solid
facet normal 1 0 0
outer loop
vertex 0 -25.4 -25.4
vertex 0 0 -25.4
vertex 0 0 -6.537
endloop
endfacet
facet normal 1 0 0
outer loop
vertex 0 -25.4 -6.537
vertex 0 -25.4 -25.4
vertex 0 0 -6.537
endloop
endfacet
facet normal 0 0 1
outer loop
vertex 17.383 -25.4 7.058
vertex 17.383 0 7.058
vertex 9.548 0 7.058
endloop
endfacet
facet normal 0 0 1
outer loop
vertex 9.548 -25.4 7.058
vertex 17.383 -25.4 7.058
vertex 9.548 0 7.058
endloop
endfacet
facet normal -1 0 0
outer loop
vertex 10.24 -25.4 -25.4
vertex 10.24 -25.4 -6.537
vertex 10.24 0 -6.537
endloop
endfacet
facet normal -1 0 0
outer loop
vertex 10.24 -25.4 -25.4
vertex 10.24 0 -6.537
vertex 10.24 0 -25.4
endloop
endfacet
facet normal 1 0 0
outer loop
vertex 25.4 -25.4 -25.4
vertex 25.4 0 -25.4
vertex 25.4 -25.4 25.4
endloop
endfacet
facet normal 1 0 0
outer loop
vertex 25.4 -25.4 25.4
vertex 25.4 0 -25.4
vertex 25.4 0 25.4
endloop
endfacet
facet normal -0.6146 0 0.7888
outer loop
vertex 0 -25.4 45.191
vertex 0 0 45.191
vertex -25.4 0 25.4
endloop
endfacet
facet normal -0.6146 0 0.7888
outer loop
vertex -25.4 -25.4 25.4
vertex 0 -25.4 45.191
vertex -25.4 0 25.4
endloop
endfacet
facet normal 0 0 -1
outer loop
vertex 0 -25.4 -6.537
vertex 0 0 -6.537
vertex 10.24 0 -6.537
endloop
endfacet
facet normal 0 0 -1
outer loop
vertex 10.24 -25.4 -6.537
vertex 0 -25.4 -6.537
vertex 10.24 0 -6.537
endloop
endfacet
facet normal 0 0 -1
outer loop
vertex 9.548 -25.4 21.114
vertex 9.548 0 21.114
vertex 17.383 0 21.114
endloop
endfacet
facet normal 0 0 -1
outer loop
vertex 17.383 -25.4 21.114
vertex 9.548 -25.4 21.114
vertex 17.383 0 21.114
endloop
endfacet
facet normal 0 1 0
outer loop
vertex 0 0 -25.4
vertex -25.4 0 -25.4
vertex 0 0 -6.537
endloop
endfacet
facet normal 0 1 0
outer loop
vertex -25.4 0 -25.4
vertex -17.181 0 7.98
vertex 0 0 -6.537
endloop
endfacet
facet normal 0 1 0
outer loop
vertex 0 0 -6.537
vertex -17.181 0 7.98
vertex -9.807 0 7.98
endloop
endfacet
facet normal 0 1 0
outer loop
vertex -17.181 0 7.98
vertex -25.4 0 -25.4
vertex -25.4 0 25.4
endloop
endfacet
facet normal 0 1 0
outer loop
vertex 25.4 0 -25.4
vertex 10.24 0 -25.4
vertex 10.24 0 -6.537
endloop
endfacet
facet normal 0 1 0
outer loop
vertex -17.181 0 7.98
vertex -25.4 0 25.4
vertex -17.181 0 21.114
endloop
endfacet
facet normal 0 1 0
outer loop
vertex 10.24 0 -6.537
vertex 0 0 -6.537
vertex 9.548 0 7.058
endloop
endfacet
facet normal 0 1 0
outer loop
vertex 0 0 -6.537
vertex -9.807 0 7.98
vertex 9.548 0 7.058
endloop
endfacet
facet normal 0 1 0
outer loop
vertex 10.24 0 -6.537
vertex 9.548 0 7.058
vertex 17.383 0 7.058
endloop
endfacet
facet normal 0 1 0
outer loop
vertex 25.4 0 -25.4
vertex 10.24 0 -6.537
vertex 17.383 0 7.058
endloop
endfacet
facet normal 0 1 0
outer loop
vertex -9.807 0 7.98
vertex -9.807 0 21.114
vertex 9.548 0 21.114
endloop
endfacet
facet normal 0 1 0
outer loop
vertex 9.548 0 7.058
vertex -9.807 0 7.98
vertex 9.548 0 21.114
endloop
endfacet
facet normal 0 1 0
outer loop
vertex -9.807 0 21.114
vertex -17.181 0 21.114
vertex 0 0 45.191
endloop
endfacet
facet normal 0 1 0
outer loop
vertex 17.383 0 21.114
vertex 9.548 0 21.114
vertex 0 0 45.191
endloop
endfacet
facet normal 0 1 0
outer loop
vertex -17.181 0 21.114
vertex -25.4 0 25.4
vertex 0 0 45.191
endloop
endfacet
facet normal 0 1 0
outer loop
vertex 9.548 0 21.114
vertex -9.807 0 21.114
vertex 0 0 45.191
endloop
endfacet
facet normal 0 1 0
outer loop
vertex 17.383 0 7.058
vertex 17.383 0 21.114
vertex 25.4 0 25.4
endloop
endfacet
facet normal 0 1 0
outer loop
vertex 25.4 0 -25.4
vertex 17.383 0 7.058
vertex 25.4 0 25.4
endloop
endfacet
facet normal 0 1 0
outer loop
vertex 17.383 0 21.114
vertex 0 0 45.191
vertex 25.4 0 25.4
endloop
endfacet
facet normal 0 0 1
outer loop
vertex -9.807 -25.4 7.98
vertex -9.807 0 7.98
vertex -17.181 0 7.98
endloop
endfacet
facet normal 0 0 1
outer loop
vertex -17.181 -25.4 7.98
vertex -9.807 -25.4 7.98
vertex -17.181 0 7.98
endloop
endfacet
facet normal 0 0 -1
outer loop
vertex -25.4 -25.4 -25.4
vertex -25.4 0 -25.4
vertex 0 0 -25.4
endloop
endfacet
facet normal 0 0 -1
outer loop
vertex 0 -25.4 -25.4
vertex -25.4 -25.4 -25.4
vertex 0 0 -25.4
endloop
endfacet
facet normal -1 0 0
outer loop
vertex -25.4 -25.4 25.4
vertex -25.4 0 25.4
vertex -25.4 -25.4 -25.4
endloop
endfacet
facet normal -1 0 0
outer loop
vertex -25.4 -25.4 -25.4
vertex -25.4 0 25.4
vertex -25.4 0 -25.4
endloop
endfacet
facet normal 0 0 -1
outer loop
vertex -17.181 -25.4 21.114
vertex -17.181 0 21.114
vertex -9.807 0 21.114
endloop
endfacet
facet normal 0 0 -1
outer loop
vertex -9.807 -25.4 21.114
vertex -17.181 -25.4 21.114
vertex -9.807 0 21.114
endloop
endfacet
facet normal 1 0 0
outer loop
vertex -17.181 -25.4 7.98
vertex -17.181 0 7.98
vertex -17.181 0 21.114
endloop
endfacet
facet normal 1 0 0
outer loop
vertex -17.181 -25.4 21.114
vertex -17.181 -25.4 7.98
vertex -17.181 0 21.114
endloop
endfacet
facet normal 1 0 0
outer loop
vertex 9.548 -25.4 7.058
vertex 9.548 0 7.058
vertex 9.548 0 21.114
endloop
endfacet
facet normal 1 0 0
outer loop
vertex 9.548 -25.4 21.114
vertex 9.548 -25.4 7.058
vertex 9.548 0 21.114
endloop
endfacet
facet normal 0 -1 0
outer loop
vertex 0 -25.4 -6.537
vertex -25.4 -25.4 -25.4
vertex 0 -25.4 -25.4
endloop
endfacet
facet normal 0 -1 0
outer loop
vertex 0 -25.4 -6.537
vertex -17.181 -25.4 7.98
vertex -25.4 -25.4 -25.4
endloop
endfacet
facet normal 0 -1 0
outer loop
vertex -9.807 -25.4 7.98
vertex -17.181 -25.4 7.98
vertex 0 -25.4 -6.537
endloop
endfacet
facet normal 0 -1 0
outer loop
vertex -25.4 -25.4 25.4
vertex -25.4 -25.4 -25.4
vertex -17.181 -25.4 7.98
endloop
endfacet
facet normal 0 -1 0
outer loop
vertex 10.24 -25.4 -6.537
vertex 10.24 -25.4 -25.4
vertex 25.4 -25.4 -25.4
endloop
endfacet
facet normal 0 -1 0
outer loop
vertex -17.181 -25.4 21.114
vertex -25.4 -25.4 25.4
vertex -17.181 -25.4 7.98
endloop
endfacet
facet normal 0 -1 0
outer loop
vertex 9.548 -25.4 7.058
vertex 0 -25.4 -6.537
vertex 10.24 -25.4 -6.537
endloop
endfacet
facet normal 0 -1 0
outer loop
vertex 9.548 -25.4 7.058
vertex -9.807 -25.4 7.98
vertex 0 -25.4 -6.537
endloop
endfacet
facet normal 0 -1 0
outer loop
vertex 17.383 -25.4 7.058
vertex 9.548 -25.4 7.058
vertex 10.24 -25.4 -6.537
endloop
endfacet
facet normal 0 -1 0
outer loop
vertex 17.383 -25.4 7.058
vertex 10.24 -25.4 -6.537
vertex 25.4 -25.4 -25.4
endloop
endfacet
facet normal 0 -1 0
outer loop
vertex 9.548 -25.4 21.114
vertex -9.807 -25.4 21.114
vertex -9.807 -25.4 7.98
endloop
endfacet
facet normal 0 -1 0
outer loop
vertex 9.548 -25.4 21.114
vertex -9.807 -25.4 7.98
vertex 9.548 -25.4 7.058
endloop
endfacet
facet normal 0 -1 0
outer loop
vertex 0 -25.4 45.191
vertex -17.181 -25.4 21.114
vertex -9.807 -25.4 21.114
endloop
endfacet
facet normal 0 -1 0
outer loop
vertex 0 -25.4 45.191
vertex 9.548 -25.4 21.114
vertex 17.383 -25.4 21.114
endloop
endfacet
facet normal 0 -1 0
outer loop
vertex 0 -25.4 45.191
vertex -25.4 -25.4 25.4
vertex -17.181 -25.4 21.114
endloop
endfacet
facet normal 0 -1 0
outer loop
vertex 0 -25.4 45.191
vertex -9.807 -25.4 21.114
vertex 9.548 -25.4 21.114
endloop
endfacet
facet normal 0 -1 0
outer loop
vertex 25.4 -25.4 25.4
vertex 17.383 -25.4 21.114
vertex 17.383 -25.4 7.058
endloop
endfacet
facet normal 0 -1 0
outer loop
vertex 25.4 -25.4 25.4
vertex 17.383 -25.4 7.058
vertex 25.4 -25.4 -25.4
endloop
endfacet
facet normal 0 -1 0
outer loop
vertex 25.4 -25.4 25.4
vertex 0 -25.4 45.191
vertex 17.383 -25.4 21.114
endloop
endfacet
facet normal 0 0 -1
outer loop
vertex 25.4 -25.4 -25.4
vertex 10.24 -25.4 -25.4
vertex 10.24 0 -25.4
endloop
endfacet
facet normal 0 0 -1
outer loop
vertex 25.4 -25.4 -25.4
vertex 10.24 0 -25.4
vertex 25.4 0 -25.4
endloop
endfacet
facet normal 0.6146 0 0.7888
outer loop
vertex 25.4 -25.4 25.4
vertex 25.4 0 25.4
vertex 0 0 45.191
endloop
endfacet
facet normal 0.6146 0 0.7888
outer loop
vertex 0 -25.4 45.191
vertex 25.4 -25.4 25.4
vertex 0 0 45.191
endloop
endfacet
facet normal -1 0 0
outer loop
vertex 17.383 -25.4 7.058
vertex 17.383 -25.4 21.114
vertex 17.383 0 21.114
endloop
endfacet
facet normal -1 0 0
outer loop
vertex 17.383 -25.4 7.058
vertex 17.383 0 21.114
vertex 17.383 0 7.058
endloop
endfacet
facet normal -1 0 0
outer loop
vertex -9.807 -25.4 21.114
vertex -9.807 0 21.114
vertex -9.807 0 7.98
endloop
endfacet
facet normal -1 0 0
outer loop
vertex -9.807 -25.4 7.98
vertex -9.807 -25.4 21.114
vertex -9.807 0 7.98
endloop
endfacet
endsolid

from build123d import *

# Parameters (mm, degrees)
F1_DEPTH = 25.4


with BuildPart() as f1:
    # F0 (on Front) → F1 (new body)
    with BuildSketch(Plane.XZ):
        Polygon((25.4, -25.4), (25.4, 25.4), (-25.4, 25.4), (-25.4, -25.4), (0, -25.4), (0, -6.536582), (10.239619, -6.536582), (10.239619, -16.214322), (10.239619, -25.4), align=None)
        Polygon((-13.493889, 7.98003), (-17.180648, 7.98003), (-17.180648, 14.547069), (-17.180648, 21.114107), (-13.493889, 21.114107), (-9.807131, 21.114107), (-9.807131, 14.547069), (-9.807131, 7.98003), align=None, mode=Mode.SUBTRACT)
        Polygon((13.46553, 7.05834), (9.548349, 7.05834), (9.548349, 14.086224), (9.548349, 21.114107), (13.46553, 21.114107), (17.382711, 21.114107), (17.382711, 14.086224), (17.382711, 7.05834), align=None, mode=Mode.SUBTRACT)
        Polygon((-25.4, 25.4), (25.4, 25.4), (0, 45.190681), align=None)
    extrude(amount=F1_DEPTH)


solid = f1.part
